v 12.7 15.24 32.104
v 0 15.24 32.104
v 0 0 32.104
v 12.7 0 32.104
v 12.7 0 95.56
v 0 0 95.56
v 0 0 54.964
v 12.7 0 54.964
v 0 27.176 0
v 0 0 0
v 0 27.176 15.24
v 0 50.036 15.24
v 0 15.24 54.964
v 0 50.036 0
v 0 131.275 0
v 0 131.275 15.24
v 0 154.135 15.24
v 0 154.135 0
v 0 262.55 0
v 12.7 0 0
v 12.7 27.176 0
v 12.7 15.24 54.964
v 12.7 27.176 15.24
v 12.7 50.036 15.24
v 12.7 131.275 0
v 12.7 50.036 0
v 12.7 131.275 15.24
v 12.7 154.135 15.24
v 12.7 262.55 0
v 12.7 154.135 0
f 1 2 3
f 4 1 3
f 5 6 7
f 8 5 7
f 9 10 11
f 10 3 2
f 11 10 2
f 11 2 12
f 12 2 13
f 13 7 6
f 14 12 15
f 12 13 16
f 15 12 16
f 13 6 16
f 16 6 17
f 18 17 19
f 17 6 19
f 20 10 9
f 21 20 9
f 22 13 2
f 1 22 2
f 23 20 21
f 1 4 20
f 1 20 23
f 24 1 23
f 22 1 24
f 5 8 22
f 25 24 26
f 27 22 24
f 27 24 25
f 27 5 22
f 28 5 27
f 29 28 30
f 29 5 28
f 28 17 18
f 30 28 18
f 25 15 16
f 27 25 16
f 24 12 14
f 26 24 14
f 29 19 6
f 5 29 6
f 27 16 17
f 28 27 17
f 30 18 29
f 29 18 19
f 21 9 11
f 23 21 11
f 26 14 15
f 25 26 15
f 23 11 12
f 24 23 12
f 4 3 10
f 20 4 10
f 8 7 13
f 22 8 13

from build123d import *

# Parameters (mm, degrees)
F1_DEPTH = 12.7


with BuildPart() as f1:
    # F0 (on Right) → F1 (new body)
    with BuildSketch(Plane.YZ):
        Polygon((0, 32.104064), (0, 0), (27.176283, 0), (27.176283, 15.24), (50.036283, 15.24), (50.036283, 0), (131.275059, 0), (131.275059, 15.24), (154.135059, 15.24), (154.135059, 0), (262.550118, 0), (0, 95.560428), (0, 54.964064), (15.24, 54.964064), (15.24, 32.104064), align=None)
    extrude(amount=F1_DEPTH)


solid = f1.part
